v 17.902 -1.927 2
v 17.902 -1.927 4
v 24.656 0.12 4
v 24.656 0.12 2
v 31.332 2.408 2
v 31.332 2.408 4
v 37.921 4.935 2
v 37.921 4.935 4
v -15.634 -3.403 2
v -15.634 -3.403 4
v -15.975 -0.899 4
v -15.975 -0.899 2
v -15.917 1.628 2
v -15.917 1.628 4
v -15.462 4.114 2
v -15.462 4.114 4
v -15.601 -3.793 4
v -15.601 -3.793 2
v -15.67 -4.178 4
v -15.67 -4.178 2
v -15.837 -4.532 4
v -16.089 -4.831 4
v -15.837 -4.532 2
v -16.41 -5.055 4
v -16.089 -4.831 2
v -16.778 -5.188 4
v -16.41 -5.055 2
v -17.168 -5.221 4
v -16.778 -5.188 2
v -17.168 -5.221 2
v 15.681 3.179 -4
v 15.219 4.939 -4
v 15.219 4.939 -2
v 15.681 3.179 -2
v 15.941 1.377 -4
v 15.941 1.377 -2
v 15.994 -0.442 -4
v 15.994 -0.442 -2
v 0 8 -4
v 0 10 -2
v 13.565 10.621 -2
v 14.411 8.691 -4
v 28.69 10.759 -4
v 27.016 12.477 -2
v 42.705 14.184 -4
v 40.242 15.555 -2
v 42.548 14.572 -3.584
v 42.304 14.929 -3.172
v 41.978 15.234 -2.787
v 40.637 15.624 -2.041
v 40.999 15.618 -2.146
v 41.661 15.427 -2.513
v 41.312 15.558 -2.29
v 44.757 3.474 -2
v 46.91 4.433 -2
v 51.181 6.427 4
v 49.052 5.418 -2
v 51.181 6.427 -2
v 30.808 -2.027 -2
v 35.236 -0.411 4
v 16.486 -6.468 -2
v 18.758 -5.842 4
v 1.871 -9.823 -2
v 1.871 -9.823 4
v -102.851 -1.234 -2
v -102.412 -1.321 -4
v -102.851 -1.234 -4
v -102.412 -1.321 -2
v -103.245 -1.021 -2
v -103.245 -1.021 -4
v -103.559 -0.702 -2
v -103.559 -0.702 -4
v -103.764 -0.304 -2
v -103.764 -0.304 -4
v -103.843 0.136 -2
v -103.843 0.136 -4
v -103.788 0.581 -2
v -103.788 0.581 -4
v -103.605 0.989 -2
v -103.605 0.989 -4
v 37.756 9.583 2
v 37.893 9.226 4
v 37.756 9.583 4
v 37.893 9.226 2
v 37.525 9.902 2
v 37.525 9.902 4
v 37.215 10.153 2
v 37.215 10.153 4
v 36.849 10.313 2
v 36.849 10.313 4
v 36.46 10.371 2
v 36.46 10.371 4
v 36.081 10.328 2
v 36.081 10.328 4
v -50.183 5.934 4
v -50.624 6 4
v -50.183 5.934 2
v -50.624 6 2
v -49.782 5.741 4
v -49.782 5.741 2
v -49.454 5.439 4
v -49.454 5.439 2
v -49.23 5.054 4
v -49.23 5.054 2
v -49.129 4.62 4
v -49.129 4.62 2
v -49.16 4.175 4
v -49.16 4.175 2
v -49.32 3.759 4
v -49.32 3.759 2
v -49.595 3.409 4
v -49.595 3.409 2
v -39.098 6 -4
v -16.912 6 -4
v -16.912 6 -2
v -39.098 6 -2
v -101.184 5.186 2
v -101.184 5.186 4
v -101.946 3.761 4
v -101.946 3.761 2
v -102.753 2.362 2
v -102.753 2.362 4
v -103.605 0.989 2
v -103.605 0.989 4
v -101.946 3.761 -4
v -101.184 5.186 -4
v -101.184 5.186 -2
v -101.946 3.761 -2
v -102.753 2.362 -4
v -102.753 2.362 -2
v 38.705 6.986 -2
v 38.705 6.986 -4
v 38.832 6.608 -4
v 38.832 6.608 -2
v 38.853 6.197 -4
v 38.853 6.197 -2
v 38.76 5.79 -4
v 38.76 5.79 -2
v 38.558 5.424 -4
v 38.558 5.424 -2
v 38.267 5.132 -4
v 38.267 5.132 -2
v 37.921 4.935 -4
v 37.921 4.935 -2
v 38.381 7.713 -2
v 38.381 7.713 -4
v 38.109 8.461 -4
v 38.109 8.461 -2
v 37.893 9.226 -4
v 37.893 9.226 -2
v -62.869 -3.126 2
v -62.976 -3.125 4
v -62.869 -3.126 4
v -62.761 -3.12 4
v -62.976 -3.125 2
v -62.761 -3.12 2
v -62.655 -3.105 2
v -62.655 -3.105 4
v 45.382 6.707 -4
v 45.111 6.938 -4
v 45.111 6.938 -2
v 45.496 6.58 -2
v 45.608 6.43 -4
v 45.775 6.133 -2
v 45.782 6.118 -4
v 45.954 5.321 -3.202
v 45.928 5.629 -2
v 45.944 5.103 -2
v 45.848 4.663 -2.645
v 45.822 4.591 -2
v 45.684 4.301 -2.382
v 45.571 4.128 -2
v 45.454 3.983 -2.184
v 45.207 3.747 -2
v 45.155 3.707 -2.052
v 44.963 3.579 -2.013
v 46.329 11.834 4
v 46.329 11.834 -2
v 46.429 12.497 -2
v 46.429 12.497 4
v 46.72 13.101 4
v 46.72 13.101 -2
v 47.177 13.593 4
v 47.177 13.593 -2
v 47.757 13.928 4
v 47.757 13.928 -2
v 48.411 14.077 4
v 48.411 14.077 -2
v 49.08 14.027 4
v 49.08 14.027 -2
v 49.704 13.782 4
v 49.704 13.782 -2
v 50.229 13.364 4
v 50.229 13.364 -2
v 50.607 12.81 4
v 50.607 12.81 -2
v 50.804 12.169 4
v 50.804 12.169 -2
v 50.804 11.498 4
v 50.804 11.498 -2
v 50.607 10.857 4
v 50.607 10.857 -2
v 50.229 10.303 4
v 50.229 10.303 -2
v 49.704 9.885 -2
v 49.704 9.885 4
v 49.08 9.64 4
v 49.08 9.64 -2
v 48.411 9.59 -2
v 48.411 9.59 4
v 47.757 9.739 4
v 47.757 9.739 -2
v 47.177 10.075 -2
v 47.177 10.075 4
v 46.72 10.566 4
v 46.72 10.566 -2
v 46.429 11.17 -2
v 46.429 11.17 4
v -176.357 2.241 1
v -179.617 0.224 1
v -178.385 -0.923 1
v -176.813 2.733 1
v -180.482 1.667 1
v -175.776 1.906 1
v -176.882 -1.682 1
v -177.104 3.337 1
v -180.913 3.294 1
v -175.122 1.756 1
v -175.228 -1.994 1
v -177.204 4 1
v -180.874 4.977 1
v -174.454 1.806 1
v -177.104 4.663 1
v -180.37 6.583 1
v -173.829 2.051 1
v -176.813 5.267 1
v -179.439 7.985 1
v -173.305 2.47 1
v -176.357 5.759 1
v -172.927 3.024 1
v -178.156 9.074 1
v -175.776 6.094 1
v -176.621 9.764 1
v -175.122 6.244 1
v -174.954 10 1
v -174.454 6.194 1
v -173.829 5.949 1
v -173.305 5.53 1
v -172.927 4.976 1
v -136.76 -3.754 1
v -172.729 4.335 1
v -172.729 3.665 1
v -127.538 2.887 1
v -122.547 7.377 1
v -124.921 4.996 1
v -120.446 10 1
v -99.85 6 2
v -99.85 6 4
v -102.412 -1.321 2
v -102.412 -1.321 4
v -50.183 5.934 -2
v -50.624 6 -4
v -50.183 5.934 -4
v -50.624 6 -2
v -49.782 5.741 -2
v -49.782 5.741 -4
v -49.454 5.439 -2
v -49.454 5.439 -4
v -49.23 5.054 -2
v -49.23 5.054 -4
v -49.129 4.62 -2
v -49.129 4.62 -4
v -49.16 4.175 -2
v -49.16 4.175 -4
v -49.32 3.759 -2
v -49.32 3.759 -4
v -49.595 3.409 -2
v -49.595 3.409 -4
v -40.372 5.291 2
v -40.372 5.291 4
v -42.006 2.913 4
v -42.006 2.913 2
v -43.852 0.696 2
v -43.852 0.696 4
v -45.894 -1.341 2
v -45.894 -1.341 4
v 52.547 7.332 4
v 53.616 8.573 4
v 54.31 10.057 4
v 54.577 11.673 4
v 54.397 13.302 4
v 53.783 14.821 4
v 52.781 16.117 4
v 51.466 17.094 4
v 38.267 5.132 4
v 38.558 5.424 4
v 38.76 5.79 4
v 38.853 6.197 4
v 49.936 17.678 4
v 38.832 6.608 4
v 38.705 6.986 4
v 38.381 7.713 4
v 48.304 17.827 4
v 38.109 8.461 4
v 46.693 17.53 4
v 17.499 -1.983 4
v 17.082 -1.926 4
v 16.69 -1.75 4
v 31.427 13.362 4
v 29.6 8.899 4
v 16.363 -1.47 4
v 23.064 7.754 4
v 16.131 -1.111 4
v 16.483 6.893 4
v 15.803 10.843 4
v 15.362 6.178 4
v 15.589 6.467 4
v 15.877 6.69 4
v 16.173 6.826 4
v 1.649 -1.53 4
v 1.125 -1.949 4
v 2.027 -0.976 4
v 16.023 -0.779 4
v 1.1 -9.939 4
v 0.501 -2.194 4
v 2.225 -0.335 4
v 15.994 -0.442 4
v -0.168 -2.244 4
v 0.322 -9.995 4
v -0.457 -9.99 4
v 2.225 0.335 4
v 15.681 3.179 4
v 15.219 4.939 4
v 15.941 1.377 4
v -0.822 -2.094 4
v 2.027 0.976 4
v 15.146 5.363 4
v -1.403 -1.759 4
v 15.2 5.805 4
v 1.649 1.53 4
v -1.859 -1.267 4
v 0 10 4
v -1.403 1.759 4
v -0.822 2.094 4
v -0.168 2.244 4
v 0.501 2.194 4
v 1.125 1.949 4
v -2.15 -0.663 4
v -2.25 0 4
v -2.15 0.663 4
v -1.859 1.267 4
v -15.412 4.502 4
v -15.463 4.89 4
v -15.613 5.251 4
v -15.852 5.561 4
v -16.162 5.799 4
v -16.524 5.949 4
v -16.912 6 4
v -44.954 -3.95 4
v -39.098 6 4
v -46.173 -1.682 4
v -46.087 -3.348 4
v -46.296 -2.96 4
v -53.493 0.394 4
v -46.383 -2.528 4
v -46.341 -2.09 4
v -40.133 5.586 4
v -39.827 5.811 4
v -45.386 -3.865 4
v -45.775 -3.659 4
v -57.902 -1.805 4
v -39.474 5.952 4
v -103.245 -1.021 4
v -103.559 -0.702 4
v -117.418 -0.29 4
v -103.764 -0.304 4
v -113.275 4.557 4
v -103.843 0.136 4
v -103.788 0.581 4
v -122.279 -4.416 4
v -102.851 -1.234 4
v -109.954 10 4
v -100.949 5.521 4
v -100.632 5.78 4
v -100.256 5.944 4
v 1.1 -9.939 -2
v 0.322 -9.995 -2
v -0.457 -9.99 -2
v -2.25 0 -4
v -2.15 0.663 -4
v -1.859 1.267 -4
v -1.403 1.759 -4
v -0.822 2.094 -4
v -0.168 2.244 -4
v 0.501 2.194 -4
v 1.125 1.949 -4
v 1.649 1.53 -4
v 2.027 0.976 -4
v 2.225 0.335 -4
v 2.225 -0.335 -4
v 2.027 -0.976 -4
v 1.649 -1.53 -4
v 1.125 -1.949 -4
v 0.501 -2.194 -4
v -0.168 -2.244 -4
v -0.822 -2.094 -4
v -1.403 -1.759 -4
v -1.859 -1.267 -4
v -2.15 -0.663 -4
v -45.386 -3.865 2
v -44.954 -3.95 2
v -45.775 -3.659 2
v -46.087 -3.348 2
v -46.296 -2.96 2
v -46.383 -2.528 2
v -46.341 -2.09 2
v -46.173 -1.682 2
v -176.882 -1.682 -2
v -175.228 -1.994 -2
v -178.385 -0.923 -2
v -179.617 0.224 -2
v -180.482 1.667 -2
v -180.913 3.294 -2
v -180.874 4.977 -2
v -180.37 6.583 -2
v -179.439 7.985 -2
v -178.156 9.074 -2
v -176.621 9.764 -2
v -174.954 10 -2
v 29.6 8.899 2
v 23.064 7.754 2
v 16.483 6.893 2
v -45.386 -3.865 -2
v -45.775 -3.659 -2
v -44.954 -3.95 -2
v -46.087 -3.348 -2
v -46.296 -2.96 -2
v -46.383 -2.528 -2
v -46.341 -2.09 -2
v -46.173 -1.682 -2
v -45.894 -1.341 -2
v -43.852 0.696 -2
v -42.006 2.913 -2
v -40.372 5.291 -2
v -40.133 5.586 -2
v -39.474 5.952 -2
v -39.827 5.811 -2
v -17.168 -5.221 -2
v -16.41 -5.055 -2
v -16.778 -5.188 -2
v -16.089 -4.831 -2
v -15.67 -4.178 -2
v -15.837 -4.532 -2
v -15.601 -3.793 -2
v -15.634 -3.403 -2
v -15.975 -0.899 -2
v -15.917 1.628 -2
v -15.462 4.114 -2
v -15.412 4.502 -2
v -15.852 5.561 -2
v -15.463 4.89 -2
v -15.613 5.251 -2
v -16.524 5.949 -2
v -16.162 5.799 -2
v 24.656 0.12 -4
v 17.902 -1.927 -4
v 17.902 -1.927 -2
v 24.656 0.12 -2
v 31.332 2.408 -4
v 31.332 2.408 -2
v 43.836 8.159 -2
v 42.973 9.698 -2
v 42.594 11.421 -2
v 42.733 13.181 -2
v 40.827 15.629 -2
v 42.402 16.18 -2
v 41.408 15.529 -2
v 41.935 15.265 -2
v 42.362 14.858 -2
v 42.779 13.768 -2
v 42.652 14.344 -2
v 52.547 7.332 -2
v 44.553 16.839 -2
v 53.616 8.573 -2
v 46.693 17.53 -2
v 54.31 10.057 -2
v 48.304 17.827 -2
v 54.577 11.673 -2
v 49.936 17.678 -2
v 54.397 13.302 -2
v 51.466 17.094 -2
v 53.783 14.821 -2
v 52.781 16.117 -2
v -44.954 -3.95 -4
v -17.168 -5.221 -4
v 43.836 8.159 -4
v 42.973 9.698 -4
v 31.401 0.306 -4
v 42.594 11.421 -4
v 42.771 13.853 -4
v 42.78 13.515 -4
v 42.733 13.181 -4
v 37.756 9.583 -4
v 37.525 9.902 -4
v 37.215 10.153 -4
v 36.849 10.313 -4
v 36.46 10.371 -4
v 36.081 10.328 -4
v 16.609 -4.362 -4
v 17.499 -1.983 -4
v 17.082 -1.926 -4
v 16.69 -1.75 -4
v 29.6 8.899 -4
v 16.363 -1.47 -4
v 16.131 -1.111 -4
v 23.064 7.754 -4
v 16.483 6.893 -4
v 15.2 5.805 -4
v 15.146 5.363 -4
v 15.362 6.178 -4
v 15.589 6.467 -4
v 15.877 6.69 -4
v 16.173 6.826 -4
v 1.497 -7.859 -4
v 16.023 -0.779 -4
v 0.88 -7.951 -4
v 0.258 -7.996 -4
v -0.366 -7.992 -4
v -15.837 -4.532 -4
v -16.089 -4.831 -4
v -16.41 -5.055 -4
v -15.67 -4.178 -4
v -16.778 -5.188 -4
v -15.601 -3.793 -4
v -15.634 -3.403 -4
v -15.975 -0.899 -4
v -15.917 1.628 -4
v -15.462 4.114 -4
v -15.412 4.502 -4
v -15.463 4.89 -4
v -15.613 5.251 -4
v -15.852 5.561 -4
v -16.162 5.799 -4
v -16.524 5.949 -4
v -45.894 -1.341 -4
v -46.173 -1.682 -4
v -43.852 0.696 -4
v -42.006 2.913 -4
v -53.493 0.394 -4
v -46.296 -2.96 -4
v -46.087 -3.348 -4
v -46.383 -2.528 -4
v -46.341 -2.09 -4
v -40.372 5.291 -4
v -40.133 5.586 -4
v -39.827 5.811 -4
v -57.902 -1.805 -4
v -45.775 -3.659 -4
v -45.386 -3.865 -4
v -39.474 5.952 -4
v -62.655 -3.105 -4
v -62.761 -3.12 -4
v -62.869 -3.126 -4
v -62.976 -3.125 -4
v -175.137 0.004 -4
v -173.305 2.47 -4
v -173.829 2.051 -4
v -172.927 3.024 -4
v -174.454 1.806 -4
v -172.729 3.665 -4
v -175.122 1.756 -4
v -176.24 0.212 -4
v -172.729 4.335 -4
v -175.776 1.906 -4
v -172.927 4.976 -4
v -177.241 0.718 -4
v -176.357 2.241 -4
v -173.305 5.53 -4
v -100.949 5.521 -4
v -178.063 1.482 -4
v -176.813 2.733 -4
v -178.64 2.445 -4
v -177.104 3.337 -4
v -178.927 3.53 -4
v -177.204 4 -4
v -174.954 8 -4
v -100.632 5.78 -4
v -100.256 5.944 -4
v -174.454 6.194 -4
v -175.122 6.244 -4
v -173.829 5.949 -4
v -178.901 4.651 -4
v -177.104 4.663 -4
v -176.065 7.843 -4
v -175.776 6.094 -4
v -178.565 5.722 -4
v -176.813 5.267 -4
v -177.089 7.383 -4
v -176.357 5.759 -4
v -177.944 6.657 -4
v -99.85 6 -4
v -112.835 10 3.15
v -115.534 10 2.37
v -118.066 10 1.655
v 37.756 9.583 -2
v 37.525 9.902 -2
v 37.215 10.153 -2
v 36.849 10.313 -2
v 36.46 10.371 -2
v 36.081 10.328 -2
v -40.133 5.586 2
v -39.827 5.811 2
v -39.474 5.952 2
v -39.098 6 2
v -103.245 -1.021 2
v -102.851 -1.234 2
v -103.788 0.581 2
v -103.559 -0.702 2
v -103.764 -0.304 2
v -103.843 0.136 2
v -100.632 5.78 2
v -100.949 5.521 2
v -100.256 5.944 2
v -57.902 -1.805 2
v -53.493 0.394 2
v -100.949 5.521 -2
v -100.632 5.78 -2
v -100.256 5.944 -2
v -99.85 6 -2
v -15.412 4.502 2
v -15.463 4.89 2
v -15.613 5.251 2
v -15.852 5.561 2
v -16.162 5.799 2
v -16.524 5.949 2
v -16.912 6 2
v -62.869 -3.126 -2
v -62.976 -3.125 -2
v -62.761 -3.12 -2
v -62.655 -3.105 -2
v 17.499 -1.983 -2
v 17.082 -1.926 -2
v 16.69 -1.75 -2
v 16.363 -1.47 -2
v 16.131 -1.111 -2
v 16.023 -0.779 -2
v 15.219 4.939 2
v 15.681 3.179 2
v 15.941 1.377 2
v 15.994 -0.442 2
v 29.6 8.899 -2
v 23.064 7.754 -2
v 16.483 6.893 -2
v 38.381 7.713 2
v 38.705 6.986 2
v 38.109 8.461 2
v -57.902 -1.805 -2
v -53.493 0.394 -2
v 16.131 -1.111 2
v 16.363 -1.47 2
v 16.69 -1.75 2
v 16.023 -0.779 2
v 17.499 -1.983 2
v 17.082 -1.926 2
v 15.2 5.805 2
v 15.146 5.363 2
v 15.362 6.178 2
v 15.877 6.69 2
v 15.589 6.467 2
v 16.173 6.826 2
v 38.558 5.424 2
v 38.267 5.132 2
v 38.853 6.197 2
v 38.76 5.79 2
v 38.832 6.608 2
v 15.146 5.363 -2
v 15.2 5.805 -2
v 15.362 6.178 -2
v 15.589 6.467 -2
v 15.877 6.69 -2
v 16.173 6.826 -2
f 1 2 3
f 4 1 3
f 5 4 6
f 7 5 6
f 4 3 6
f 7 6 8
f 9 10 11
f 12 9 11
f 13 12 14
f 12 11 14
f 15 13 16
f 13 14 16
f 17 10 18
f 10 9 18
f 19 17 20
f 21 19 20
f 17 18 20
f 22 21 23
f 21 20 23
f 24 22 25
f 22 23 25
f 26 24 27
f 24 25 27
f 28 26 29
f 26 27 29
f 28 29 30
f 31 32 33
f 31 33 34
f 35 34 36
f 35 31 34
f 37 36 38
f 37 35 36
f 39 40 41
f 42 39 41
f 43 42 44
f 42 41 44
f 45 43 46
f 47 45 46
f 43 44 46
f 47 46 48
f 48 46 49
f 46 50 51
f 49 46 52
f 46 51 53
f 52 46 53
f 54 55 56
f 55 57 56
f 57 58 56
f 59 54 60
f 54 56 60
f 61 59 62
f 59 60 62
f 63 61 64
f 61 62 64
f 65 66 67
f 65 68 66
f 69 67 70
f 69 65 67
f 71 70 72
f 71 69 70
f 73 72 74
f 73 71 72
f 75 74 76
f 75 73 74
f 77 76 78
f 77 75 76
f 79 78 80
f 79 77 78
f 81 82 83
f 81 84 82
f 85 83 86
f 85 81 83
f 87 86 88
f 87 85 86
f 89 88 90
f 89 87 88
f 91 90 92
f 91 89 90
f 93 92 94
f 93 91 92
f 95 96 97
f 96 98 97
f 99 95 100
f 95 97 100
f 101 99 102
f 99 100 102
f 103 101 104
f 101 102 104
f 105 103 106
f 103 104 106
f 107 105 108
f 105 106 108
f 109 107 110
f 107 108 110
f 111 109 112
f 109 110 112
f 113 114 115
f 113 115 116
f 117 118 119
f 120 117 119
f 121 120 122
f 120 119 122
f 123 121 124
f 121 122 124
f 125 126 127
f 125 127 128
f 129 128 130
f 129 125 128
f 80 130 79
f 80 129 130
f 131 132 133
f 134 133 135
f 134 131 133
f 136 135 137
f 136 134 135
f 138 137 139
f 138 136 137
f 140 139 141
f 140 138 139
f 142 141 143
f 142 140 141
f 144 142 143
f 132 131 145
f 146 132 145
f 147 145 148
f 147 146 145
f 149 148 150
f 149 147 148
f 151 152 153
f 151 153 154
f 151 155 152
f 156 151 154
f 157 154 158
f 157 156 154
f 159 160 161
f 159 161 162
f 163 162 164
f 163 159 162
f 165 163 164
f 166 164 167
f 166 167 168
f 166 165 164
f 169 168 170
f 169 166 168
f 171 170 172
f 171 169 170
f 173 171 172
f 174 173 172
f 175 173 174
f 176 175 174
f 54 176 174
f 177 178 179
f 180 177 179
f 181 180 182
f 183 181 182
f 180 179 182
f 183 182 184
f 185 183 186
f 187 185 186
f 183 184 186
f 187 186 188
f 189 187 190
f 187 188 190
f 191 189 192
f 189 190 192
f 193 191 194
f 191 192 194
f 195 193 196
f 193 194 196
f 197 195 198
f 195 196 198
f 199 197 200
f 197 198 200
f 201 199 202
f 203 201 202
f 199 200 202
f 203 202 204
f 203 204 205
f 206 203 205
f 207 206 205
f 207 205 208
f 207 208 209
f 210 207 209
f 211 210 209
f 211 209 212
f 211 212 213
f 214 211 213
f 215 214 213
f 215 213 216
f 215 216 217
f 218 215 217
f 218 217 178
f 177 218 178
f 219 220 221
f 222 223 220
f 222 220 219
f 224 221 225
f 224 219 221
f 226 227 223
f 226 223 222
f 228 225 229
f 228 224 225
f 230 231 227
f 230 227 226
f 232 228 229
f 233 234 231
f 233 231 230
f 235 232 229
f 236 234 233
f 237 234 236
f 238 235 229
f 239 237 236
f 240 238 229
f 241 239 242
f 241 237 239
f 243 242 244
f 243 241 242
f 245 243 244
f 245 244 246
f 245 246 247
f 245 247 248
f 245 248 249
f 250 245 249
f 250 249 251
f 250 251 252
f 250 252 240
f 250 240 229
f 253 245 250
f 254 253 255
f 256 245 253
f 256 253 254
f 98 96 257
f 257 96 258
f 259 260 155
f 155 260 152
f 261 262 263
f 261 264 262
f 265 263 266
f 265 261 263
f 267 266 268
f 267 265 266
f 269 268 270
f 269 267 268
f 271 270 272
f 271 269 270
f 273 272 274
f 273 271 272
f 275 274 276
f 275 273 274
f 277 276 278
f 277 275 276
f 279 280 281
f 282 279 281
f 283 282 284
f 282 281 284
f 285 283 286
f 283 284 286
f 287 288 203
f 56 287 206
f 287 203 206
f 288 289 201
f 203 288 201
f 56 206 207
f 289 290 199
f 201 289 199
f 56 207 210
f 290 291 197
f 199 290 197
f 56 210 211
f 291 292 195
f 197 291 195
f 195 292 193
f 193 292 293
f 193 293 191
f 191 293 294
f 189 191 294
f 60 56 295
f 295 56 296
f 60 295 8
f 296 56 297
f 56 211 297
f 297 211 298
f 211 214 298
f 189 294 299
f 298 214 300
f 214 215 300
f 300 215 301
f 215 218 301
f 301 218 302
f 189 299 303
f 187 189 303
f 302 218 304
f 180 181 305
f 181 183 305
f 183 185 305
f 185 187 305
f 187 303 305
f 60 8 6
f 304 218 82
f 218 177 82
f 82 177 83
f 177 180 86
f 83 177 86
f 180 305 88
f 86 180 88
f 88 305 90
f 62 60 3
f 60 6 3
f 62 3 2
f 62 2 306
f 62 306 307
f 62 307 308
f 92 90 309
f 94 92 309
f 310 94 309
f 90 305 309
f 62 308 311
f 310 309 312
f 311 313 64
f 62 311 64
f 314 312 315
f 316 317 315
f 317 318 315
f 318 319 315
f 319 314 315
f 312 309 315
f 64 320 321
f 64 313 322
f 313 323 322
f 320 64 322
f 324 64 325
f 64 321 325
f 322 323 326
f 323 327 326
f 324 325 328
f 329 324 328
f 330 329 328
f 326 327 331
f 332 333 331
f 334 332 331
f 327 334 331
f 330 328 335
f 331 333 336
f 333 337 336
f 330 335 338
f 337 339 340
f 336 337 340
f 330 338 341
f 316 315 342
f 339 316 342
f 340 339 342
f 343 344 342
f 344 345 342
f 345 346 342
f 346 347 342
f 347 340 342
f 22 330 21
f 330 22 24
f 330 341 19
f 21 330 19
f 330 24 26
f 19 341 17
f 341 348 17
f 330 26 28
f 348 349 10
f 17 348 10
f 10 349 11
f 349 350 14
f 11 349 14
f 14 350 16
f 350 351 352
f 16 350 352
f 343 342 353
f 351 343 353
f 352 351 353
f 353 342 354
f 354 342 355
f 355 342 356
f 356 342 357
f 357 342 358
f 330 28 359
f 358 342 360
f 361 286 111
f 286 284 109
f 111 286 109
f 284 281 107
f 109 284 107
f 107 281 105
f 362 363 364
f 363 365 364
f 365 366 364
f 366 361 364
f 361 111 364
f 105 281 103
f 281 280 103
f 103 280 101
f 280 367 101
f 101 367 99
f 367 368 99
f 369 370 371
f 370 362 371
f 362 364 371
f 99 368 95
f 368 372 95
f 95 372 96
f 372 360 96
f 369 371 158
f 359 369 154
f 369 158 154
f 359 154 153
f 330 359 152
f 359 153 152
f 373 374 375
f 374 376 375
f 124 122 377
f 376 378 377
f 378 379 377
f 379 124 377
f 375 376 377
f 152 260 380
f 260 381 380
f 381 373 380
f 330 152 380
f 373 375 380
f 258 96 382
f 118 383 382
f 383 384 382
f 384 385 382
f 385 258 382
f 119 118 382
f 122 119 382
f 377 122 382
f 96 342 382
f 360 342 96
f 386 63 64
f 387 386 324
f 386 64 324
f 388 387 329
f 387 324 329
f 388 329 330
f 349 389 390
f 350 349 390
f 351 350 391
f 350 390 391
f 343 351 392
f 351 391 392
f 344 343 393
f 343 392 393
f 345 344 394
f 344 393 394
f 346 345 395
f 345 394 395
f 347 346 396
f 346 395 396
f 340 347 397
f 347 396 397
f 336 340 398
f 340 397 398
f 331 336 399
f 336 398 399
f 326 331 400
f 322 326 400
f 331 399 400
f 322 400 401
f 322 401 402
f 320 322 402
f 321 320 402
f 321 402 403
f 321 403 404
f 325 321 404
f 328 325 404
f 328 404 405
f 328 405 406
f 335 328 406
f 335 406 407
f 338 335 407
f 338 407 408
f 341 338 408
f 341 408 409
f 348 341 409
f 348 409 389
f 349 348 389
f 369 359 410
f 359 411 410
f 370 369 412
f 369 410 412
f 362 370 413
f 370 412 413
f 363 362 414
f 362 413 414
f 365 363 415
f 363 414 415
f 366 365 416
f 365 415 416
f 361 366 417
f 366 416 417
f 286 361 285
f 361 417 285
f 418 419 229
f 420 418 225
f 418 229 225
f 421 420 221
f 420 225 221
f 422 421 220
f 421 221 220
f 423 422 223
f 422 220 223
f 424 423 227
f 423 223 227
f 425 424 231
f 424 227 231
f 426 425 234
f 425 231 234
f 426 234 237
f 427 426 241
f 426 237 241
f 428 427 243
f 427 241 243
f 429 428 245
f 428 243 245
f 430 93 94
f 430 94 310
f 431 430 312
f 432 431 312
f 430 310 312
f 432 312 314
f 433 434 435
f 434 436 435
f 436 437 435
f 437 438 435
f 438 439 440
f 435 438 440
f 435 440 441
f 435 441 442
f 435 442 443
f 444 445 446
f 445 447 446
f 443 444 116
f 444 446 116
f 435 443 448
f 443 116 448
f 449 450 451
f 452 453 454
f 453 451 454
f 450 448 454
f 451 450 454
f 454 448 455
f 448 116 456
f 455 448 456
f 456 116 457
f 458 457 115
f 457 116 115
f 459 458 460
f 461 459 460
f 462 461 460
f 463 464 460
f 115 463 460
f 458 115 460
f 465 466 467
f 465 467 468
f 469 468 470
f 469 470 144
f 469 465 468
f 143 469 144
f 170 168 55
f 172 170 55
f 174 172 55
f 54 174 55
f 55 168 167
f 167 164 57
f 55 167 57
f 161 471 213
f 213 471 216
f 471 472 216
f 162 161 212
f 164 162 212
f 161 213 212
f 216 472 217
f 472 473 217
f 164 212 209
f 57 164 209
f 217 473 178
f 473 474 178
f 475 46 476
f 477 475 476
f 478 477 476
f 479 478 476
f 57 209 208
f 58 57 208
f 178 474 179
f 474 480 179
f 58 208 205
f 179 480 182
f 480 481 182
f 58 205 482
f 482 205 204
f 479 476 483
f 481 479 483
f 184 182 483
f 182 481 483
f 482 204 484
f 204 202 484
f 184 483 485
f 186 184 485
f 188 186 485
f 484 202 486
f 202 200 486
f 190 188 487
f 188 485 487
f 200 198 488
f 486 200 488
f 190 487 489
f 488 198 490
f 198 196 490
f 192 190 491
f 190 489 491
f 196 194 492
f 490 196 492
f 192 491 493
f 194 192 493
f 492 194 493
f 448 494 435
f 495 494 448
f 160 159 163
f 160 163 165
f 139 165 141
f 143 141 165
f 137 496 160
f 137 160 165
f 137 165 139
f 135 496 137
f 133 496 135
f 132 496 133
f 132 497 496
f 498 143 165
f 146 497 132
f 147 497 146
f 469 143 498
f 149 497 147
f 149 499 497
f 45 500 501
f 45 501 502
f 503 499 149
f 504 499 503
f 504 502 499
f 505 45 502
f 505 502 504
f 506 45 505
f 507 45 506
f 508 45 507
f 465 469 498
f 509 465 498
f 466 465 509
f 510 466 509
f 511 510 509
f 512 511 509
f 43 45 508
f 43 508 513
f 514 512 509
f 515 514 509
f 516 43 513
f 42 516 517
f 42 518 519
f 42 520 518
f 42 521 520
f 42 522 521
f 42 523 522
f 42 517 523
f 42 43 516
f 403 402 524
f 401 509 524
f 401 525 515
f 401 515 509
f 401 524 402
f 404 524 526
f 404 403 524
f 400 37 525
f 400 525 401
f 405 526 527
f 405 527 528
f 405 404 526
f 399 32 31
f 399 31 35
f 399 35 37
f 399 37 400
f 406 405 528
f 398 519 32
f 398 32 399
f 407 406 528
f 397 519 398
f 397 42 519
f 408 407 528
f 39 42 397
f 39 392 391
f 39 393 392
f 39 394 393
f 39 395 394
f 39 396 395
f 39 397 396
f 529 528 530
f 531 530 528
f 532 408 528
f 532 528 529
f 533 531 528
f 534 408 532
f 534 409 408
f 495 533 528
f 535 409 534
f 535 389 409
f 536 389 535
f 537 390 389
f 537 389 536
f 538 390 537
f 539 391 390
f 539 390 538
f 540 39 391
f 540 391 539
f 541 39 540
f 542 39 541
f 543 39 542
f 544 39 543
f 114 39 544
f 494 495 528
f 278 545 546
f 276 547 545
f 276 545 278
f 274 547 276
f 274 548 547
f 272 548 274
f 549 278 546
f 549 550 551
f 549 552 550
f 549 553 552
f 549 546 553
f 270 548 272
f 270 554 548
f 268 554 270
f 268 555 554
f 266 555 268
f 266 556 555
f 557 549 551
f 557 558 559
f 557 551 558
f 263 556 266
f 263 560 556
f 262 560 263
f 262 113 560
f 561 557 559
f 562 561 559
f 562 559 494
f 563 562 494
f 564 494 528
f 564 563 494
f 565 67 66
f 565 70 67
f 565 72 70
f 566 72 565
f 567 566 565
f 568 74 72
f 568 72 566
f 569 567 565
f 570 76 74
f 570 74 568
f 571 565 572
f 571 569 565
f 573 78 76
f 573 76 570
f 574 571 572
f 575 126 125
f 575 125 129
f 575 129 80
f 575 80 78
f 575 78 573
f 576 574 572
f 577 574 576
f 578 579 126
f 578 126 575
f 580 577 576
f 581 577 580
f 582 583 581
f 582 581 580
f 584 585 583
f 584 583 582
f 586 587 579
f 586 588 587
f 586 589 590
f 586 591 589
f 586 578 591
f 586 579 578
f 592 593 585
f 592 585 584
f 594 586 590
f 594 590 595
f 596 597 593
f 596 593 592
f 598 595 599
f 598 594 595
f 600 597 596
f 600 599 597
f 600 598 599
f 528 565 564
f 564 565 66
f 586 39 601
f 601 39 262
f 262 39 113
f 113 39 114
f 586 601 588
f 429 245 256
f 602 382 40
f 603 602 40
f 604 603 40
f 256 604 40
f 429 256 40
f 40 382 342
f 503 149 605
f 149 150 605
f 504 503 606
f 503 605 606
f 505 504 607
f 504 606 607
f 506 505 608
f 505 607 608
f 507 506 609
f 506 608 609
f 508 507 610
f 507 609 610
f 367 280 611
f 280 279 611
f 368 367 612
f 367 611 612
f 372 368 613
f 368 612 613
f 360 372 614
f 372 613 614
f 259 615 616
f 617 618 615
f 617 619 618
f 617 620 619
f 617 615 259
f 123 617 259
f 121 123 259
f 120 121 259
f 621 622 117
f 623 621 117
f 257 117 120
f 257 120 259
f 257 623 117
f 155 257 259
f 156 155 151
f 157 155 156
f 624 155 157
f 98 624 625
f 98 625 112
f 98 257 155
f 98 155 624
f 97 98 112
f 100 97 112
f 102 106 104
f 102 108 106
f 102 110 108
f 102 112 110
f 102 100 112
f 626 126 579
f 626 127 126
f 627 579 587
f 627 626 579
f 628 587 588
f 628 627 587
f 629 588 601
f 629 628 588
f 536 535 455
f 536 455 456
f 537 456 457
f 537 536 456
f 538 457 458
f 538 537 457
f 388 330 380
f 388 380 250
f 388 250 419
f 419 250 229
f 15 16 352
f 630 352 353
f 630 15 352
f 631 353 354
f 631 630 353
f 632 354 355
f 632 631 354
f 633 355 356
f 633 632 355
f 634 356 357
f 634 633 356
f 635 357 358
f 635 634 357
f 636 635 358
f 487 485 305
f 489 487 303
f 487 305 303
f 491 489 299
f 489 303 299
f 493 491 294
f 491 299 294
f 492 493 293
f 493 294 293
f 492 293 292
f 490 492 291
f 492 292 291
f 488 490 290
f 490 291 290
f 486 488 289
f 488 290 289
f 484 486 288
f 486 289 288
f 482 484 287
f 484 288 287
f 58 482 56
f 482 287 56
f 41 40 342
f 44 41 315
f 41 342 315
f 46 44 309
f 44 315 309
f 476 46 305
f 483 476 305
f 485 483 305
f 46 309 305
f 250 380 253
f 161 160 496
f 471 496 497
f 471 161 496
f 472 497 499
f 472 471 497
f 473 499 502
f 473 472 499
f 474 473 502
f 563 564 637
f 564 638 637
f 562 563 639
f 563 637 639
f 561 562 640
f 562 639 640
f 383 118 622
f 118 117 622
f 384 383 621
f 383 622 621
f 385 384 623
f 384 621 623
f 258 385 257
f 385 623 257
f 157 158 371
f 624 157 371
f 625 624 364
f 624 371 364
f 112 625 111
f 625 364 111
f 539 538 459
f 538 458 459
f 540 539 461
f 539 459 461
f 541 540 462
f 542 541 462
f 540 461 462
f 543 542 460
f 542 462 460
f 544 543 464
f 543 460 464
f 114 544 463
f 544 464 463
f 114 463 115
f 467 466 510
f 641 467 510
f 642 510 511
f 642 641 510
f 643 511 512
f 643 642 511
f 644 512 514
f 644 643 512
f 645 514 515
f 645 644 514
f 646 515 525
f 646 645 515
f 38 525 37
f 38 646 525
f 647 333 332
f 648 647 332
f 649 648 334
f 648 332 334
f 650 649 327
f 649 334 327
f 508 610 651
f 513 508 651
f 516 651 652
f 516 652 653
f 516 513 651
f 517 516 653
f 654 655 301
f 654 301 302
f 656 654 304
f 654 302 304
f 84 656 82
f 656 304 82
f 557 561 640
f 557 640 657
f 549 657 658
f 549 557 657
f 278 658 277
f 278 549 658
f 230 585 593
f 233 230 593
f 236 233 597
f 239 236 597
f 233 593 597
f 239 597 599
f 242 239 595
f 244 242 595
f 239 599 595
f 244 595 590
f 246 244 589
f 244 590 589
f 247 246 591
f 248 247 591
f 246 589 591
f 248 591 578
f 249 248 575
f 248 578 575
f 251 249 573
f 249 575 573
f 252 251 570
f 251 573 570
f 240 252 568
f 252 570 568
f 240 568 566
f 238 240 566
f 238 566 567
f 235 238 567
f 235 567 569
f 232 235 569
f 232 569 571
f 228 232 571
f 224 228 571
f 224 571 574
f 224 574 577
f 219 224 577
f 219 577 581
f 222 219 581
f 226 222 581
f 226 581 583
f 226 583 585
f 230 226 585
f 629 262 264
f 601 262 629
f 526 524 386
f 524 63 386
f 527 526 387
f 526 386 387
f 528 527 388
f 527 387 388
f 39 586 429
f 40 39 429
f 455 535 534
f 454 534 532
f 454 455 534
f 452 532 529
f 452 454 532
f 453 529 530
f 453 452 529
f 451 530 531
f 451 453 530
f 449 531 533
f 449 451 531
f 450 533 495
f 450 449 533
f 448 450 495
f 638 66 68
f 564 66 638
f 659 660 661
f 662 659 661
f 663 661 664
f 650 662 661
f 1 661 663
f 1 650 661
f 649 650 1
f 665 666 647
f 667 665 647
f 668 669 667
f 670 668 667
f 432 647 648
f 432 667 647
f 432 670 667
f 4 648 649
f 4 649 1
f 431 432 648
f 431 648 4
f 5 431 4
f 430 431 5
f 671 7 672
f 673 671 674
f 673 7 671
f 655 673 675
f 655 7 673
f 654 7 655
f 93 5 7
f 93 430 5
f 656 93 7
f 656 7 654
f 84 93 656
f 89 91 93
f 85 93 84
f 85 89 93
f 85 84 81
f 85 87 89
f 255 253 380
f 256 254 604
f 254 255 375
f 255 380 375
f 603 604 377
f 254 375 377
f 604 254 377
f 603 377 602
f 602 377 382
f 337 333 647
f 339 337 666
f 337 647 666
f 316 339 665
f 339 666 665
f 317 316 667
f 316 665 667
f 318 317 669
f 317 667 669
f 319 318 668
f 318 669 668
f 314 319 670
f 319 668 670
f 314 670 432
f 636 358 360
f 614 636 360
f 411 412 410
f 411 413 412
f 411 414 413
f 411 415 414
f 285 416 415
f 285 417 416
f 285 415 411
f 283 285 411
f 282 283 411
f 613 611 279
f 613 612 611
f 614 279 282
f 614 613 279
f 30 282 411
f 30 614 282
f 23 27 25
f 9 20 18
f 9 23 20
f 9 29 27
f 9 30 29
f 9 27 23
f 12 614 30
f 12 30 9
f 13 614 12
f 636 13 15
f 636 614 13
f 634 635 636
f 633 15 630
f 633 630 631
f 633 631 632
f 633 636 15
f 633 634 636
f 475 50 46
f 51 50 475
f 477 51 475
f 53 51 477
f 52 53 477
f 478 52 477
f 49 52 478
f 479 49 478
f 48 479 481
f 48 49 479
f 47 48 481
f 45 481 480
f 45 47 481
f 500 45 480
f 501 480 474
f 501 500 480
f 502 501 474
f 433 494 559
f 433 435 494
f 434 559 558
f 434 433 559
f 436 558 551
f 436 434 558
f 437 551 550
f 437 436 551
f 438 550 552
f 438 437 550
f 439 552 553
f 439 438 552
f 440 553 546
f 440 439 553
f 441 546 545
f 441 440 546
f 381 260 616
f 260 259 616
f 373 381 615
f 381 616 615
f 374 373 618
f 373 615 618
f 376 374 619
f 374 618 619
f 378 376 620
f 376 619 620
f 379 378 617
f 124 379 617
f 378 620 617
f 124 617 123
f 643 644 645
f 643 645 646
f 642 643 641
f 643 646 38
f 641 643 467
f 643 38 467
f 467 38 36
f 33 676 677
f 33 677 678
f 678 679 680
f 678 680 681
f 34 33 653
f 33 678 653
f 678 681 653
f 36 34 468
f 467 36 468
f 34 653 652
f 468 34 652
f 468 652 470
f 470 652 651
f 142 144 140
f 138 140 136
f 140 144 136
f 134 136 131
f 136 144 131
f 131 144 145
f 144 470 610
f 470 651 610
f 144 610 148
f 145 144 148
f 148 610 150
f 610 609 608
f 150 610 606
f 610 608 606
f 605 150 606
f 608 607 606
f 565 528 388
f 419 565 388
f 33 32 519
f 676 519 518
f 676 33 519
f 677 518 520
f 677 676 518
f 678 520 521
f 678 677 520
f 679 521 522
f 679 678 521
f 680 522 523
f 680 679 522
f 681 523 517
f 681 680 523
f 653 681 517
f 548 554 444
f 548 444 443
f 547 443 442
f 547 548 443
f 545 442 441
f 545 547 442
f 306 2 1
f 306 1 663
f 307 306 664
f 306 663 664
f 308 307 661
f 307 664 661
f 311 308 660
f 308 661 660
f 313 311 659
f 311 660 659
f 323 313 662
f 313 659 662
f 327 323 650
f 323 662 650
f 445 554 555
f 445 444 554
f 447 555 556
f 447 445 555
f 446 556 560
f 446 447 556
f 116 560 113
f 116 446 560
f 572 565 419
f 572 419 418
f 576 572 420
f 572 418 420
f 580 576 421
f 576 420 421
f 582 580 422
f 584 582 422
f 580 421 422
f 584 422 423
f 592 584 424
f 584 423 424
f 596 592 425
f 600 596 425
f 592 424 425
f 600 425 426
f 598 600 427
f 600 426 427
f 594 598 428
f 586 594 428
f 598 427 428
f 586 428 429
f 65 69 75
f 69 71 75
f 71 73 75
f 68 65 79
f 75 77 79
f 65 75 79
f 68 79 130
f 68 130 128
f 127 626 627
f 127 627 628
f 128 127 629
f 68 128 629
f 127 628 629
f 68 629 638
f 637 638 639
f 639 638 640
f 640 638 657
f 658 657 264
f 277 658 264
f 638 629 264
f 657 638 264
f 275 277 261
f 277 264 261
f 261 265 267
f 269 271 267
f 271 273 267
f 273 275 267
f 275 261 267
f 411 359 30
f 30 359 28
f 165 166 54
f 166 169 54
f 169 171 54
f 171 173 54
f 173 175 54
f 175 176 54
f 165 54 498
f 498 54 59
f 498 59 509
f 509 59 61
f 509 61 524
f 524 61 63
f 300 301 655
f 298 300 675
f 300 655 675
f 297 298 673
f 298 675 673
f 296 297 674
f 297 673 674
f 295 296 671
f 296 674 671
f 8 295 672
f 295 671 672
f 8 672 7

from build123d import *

# Parameters (mm, degrees)
BOSS_EXTRUDE2_DEPTH     = 4
CUT_EXTRUDE1_DEPTH      = 3
BOSS_EXTRUDE4_DEPTH     = 24
CUT_EXTRUDE3_DEPTH      = 25
CUT_EXTRUDE3_DEPTH_BACK = 183.067360447
SKETCH8_OUTSIDE_W       = 285.221
SKETCH8_OUTSIDE_H       = 85.963
CUT_EXTRUDE5_START      = -2
SKETCH15_R              = 6
CUT_EXTRUDE5_DEPTH      = 2
FILLET2_START           = -5
FILLET2_DEPTH           = 3
CUT_EXTRUDE4_DEPTH      = 2
FILLET1_R               = 1.5
FILLET1_OF_MIRROR2_R    = 1.5
CHAMFER2_SIZE           = 2
M4_CLEARANCE_HOLE1_D    = 4.5


with BuildPart() as part:
    # Sketch1 → Boss-Extrude2 (new, symmetric)
    with BuildSketch(Plane.XY):
        with BuildLine():
            Line((-174.954279742, 10), (0, 10))
            ThreePointArc((0, 10), (23.648322027, 11.894462409), (46.69345503, 17.529528282))
            ThreePointArc((46.69345503, 17.529528282), (54.142205969, 14.082195987), (51.181218931, 6.427096624))
            ThreePointArc((51.181218931, 6.427096624), (27.055536633, -3.305079876), (1.870729257, -9.823460289))
            ThreePointArc((1.870729257, -9.823460289), (0.711714534, -9.974640967), (-0.457023425, -9.98955102))
            Line((-0.457023425, -9.98955102), (-175.228493797, -1.993730612))
            ThreePointArc((-175.228493797, -1.993730612), (-180.95271219, 4.137142857), (-174.954279742, 10))
        make_face()
    extrude(amount=BOSS_EXTRUDE2_DEPTH, both=True)

    # Sketch4 → Cut-Extrude1 (cut)
    with BuildSketch(Plane.XY.offset(4)):
        with BuildLine():
            ThreePointArc((-174.954279742, 10), (-180.95271219, 4.137142857), (-175.228493797, -1.993730612))
            Line((-175.228493797, -1.993730612), (-122.27878396, -4.416187605))
            ThreePointArc((-122.27878396, -4.416187605), (-115.249733713, 2.05087413), (-109.954279742, 10))
            Line((-109.954279742, 10), (-174.954279742, 10))
        make_face()
    extrude(amount=-CUT_EXTRUDE1_DEPTH, mode=Mode.SUBTRACT)

    # Sweep2: sweep along a curve in space
    with BuildLine() as sweep2_path:
        ThreePointArc((-122.27878396, -4.416187605, 1), (-115.249733713, 2.05087413, 1), (-109.954279742, 10, 1))
    # Sketch9 → Sweep2 (sweep)
    with BuildSketch(Plane(origin=(-18.347220561, -36.300543819, 0), x_dir=(0.8924819376724606, -0.45108313083999296, 0), z_dir=(0.4510831308399929, 0.8924819376724605, 0))):
        Polygon((-102.643039948, -1), (-102.643039948, -4), (-111.643039948, -1), align=None)
    sweep(path=sweep2_path.line)

    # Sketch10 → Boss-Extrude4 (add)
    with BuildSketch(Plane(origin=(-82.616299838, -59.493723404, 0), x_dir=(0, 0, 1), z_dir=(-0.8114878209620178, -0.584369332212357, 0))):
        Polygon((1, 67.87228887), (4, 67.87228887), (1, 76.87228887), align=None)
    extrude(amount=BOSS_EXTRUDE4_DEPTH)

    # Sketch8 outside → Cut-Extrude3 (cut, two sides: drawn at the far end of the back side and taken through both)
    with BuildSketch(Plane.XY.offset(-4).offset(-CUT_EXTRUDE3_DEPTH_BACK)):
        with Locations((-63.1875, -0.3035)):
            Rectangle(SKETCH8_OUTSIDE_W, SKETCH8_OUTSIDE_H)
        with BuildLine():
            Line((0, 10), (-174.954279742, 10))
            ThreePointArc((-174.954279742, 10), (-180.95271219, 4.137142857), (-175.228493797, -1.993730612))
            Line((-175.228493797, -1.993730612), (-0.457023425, -9.98955102))
            ThreePointArc((-0.457023425, -9.98955102), (0.711714534, -9.974640967), (1.870729257, -9.823460289))
            ThreePointArc((1.870729257, -9.823460289), (27.055536633, -3.305079876), (51.181218931, 6.427096624))
            ThreePointArc((51.181218931, 6.427096624), (54.142205969, 14.082195987), (46.69345503, 17.529528282))
            ThreePointArc((46.69345503, 17.529528282), (23.648322027, 11.894462409), (0, 10))
        make_face(mode=Mode.SUBTRACT)
    extrude(amount=CUT_EXTRUDE3_DEPTH + CUT_EXTRUDE3_DEPTH_BACK, mode=Mode.SUBTRACT)

    # Sketch15 → Cut-Extrude5 (cut)
    with BuildSketch(Plane(origin=(0, 0, -4), x_dir=(-1, 0, 0), z_dir=(0, 0, -1)).offset(CUT_EXTRUDE5_START)):
        with Locations((-48.579466687, 11.83365609)):
            Circle(SKETCH15_R)
    extrude(amount=CUT_EXTRUDE5_DEPTH, mode=Mode.SUBTRACT)

    # Fillet2: read off the stored shape, not the designer's step
    # Fillet2 outline → Fillet2 (cut)
    with BuildSketch(Plane.XY.offset(FILLET2_START)):
        with BuildLine():
            ThreePointArc((40.241823664, 15.554681857), (42.163553049, 15.077161786), (42.732589809, 13.180515689))
            ThreePointArc((42.732589809, 13.180515689), (44.143492284, 15.873721819), (46.69345503, 17.529528282))
            ThreePointArc((46.69345503, 17.529528282), (43.478853193, 16.505470524), (40.241823664, 15.554681857))
        make_face()
        with BuildLine():
            ThreePointArc((45.110606605, 6.938044817), (45.943997016, 5.103233461), (44.757331788, 3.474461553))
            ThreePointArc((44.757331788, 3.474461553), (47.982323267, 4.922391468), (51.181218931, 6.427096624))
            ThreePointArc((51.181218931, 6.427096624), (48.076241077, 5.854796334), (45.110606605, 6.938044817))
        make_face()
    extrude(amount=FILLET2_DEPTH, mode=Mode.SUBTRACT)

    # Sketch14 → Cut-Extrude4 (cut)
    with BuildSketch(Plane.XY.offset(4)):
        with BuildLine():
            Line((-14.832396974, 6), (-39.944961285, 6))
            ThreePointArc((-39.944961285, 6), (-43.908510482, 0.633863605), (-48.921261535, -3.768121054))
            Line((-48.921261535, -3.768121054), (-15.091112688, -5.315855326))
            ThreePointArc((-15.091112688, -5.315855326), (-15.995819862, 0.365714286), (-14.832396974, 6))
        make_face()
        with BuildLine():
            ThreePointArc((-62.816908131, -3.132393183), (-54.164987884, -0.012926968), (-47.205713301, 6))
            Line((-47.205713301, 6), (-100.774922993, 6))
            ThreePointArc((-100.774922993, 6), (-102.783982304, 2.310087116), (-105.095731275, -1.198130822))
            Line((-105.095731275, -1.198130822), (-62.816908131, -3.132393183))
        make_face()
        with BuildLine():
            ThreePointArc((37.636421144, 10.71573201), (26.161853464, 8.260130678), (14.532481339, 6.693802069))
            ThreePointArc((14.532481339, 6.693802069), (15.849901808, 2.186461221), (15.802019276, -2.509220357))
            ThreePointArc((15.802019276, -2.509220357), (27.792022964, 1.161065661), (39.522801968, 5.590513918))
            ThreePointArc((39.522801968, 5.590513918), (38.25647934, 8.034191359), (37.636421144, 10.71573201))
        make_face()
    cut_extrude4 = extrude(amount=-CUT_EXTRUDE4_DEPTH, mode=Mode.SUBTRACT)

    # Fillet1
    fillet1_edges = [part.edges().sort_by_distance(p)[0] for p in [
        (14.532481339, 6.693802069, 3),
        (37.636421144, 10.71573201, 3),
        (39.522801968, 5.590513918, 3),
        (15.802019276, -2.509220357, 3),
        (-39.944961285, 6, 3),
        (-14.832396974, 6, 3),
        (-15.091112688, -5.315855326, 3),
        (-48.921261535, -3.768121054, 3),
        (-47.205713301, 6, 3),
        (-62.816908131, -3.132393183, 3),
        (-105.095731275, -1.198130822, 3),
        (-100.774922993, 6, 3),
    ]]
    fillet(fillet1_edges, radius=FILLET1_R)

    # Mirror2: Cut-Extrude4 across plane
    add(cut_extrude4.mirror(Plane.XY), mode=Mode.SUBTRACT)

    # Fillet1 of Mirror2
    fillet1_of_mirror2_edges = [part.edges().sort_by_distance(p)[0] for p in [
        (14.532481339, 6.693802069, -3),
        (37.636421144, 10.71573201, -3),
        (39.522801968, 5.590513918, -3),
        (15.802019276, -2.509220357, -3),
        (-39.944961285, 6, -3),
        (-14.832396974, 6, -3),
        (-15.091112688, -5.315855326, -3),
        (-48.921261535, -3.768121054, -3),
        (-47.205713301, 6, -3),
        (-62.816908131, -3.132393183, -3),
        (-105.095731275, -1.198130822, -3),
        (-100.774922993, 6, -3),
    ]]
    fillet(fillet1_of_mirror2_edges, radius=FILLET1_OF_MIRROR2_R)

    # Chamfer2
    # the kernel refuses this chamfer: 2 mm, written as the material it takes off along each edge
    with BuildSketch(Plane(origin=(-35.543855882, 186.645745489, -4), x_dir=(0.42492369608644903, -0.9052291712623004, 0), z_dir=(0.9052291712623004, 0.42492369608644903, 0))) as chamfer2_piece_1:
        Polygon((200 - CHAMFER2_SIZE, 0), (200, -CHAMFER2_SIZE), (200, 0), align=None)
    revolve(axis=Axis((-35.543855882, 186.645745489, -4), (0, 0, -1)), revolution_arc=14.36382118, mode=Mode.SUBTRACT)
    with BuildSketch(Plane(origin=(-0.457023425, -9.98955102, -4), x_dir=(0.04570234246318501, 0.9989551020408164, 0), z_dir=(-0.9989551020408164, 0.04570234246318502, 0)), Plane(origin=(-174.954279742, 10, -4), x_dir=(0, -1, 0), z_dir=(1, 0, 0))) as chamfer2_piece_2:
        Polygon((CHAMFER2_SIZE, 0), (0, -CHAMFER2_SIZE), (0, 0), align=None)
    extrude(amount=174.954279742, mode=Mode.SUBTRACT)
    with BuildSketch(Plane(origin=(0, 158.546658899, -4), x_dir=(0, -1, 0), z_dir=(-1, 0, 0))) as chamfer2_piece_3:
        Polygon((148.546658899 + CHAMFER2_SIZE, 0), (148.546658899, CHAMFER2_SIZE), (148.546658899, 0), align=None)
    revolve(axis=Axis((0, 158.546658899, -4), (0, 0, 1)), revolution_arc=17.7019097, mode=Mode.SUBTRACT)
    with BuildSketch(Plane(origin=(-174.954279742, 4, -4), x_dir=(-0.045702342463191735, -0.998955102040816, 0), z_dir=(0.998955102040816, -0.045702342463191735, 0))) as chamfer2_piece_4:
        Polygon((6 - CHAMFER2_SIZE, 0), (6, -CHAMFER2_SIZE), (6, 0), align=None)
    revolve(axis=Axis((-174.954279742, 4, -4), (0, 0, -1)), revolution_arc=177.380536242, mode=Mode.SUBTRACT)
    with BuildSketch(Plane(origin=(0, 0, -4), x_dir=(0.187072925695108, -0.9823460288879232, 0), z_dir=(0.9823460288879232, 0.187072925695108, 0))) as chamfer2_piece_5:
        Polygon((10 - CHAMFER2_SIZE, 0), (10, -CHAMFER2_SIZE), (10, 0), align=None)
    revolve(axis=Axis((0, 0, -4), (0, 0, -1)), revolution_arc=13.401476298, mode=Mode.SUBTRACT)

    # M4 Clearance Hole1 (through all)
    with Locations(Plane.XY.offset(4)):
        with Locations((0, 0), (48.579466687, 11.83365609), (-174.954279742, 4)):
            Hole(M4_CLEARANCE_HOLE1_D / 2)


solid = part.part
